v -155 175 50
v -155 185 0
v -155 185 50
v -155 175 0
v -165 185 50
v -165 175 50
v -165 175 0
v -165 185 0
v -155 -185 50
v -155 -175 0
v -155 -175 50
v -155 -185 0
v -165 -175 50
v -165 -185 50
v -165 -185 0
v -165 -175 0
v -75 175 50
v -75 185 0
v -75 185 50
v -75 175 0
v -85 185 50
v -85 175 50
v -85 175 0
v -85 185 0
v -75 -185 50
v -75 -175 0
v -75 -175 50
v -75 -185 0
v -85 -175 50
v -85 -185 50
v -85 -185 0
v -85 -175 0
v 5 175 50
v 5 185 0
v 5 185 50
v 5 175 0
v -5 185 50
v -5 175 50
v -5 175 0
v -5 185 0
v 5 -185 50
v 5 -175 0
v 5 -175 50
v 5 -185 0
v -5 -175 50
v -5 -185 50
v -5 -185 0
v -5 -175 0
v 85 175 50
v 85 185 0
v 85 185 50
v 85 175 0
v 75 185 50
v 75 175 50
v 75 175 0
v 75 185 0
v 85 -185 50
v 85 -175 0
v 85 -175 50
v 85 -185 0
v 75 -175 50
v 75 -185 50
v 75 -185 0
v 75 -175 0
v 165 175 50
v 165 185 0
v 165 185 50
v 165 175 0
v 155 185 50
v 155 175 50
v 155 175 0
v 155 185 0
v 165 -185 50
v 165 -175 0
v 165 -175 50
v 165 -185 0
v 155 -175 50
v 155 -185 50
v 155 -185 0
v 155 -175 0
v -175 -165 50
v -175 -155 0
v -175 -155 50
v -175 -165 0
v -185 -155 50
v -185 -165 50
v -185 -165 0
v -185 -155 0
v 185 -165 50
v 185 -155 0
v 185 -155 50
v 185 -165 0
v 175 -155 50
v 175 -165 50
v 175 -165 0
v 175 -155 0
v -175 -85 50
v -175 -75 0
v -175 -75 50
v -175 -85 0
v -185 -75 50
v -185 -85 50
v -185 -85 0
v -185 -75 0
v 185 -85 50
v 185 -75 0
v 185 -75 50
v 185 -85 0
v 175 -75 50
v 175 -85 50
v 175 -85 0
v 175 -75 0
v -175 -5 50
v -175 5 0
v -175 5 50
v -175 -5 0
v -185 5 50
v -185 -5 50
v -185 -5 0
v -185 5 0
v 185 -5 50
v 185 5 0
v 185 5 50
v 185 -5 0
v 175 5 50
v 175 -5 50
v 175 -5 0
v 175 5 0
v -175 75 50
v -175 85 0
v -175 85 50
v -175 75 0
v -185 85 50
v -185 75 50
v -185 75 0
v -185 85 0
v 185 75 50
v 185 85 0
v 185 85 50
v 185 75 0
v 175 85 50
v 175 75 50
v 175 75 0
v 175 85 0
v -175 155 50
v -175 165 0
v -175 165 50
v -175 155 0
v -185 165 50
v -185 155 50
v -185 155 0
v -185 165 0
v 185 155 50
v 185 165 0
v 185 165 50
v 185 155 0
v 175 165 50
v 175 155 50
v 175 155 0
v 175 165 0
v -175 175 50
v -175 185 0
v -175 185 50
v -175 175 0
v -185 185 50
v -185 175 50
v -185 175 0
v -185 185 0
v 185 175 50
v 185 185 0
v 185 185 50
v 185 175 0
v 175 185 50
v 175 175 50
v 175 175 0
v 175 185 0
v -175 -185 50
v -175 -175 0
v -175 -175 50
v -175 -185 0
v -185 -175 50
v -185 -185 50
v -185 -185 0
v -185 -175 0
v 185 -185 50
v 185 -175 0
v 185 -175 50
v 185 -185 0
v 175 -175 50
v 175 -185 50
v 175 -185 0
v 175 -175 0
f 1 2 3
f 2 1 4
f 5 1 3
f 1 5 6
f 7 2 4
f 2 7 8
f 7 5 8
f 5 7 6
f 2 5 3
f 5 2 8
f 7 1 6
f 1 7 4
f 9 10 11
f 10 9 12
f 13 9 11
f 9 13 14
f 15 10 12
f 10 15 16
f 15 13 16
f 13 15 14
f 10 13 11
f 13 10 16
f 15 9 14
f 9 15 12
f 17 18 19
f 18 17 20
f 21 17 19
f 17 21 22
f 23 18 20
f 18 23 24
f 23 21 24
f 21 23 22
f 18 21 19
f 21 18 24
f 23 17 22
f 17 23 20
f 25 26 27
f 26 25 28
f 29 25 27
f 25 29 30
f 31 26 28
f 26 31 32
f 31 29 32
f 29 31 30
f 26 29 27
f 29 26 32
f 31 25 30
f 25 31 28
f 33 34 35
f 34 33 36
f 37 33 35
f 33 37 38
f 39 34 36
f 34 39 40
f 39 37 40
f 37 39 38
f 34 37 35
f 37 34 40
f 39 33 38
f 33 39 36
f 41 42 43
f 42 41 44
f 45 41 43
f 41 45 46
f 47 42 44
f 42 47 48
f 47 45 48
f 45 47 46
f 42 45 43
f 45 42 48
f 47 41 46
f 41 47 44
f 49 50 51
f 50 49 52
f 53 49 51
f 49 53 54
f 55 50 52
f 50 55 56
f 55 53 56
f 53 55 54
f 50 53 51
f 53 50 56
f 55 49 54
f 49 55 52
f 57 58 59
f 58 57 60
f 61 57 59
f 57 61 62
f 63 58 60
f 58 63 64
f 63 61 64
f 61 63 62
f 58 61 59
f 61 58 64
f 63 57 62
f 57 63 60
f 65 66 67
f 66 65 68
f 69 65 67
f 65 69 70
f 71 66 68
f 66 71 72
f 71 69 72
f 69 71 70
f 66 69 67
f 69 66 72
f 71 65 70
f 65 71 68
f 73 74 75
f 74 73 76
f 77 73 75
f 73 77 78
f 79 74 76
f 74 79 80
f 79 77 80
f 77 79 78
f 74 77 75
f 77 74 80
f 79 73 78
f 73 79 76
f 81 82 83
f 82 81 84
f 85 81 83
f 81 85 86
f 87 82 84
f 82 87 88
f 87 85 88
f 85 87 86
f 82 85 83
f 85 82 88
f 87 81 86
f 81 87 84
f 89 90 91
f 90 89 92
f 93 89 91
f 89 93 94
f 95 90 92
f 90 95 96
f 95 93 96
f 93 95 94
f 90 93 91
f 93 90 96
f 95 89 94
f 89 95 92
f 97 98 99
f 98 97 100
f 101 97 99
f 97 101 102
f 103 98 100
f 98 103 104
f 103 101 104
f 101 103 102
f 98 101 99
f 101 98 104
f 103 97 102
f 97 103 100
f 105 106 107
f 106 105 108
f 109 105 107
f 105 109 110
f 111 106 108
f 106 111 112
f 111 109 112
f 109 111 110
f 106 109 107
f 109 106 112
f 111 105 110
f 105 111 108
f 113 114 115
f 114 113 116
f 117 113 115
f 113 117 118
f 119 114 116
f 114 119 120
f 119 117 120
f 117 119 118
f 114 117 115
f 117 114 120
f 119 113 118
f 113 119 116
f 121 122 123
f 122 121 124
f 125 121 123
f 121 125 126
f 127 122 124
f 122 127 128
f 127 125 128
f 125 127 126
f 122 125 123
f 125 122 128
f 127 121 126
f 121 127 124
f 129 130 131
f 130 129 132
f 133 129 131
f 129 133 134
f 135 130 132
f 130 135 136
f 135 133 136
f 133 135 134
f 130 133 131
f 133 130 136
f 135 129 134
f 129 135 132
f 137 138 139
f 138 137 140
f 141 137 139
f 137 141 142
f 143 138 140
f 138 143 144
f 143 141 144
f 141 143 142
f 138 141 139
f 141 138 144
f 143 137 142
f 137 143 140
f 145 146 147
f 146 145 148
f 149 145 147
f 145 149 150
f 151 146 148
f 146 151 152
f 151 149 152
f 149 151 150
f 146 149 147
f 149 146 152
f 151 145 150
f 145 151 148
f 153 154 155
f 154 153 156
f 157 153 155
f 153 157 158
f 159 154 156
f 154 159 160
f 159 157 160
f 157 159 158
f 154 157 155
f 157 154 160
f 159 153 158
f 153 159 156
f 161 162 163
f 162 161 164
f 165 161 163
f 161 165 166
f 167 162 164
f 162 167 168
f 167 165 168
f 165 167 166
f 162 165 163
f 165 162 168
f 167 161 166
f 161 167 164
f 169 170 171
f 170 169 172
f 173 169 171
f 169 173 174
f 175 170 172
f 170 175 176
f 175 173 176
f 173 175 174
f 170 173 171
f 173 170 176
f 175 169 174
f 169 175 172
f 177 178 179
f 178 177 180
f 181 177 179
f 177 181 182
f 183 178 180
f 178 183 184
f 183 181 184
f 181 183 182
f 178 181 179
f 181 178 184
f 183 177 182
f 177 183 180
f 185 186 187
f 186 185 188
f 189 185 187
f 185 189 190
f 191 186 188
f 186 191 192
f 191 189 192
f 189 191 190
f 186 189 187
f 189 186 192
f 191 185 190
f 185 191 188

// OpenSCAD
// Cage slice 10
// Internal cavity: 350 x 350 x 700 mm
// Bar thickness: 10 mm (square)
// Gap between bars: 70 mm (uniform)
// Slice index: 10, slice Z range: [500, 550] (local coordinates 0..50)
// This file places the slice with its bottom on Z=0; when assembling, translate in Z by 500 mm.
// Export to STL with OpenSCAD: Render -> Export as STL.

bar = 10;
gap = 70;
s = bar + gap;
$fn = 64;  // cylinder resolution

x_centers = [-160, -80, 0, 80, 160];
y_centers = [-160, -80, 0, 80, 160];
z_centers = [5, 85, 165, 245, 325, 405, 485, 565, 645];

slice_index = 10;
slice_h = 50;

front_y = 180;
back_y = -180;
left_x = -180;
right_x = 180;
panel_length = 370;

hole_diam = 6.6;

module slice() {
    union() {
        // vertical bars on front and back (along Z)
        for (x = x_centers) {
            translate([x, front_y, slice_h/2]) cube([bar, bar, slice_h], center=true);
            translate([x, back_y, slice_h/2])  cube([bar, bar, slice_h], center=true);
        }
        // vertical bars on left and right (along Z)
        for (y = y_centers) {
            translate([left_x, y, slice_h/2])  cube([bar, bar, slice_h], center=true);
            translate([right_x, y, slice_h/2]) cube([bar, bar, slice_h], center=true);
        }
        // explicit corner vertical bars (ensure 4 corners for M6 rods)
        translate([-180, 180, slice_h/2]) cube([bar, bar, slice_h], center=true);
        translate([180, 180, slice_h/2]) cube([bar, bar, slice_h], center=true);
        translate([-180, -180, slice_h/2]) cube([bar, bar, slice_h], center=true);
        translate([180, -180, slice_h/2]) cube([bar, bar, slice_h], center=true);

        // horizontal bars (10 mm thick in Z) that lie inside this slice
        for (zc = z_centers) {
            z_local = zc - slice_index*slice_h;
            // include this horizontal bar if its center lies within this slice and it fits entirely here
            if (z_local >= bar/2 && z_local <= slice_h - bar/2) {
                // front and back horizontal bars (run along X)
                translate([0, front_y, z_local]) cube([panel_length, bar, bar], center=true);
                translate([0, back_y,  z_local]) cube([panel_length, bar, bar], center=true);
                // left and right horizontal bars (run along Y)
                translate([left_x, 0, z_local]) cube([bar, panel_length, bar], center=true);
                translate([right_x,0, z_local]) cube([bar, panel_length, bar], center=true);
            }
        }
    }
}

difference() {
    slice();
    // four vertical holes for M6 rods through corner bars (slightly longer than slice to ensure clean subtraction)
    translate([-180, 180, slice_h/2]) rotate([0,0,0]) cylinder(h = slice_h*4, r = hole_diam/2, center=true);
    translate([180, 180, slice_h/2]) rotate([0,0,0]) cylinder(h = slice_h*4, r = hole_diam/2, center=true);
    translate([-180, -180, slice_h/2]) rotate([0,0,0]) cylinder(h = slice_h*4, r = hole_diam/2, center=true);
    translate([180, -180, slice_h/2]) rotate([0,0,0]) cylinder(h = slice_h*4, r = hole_diam/2, center=true);
}

slice();
